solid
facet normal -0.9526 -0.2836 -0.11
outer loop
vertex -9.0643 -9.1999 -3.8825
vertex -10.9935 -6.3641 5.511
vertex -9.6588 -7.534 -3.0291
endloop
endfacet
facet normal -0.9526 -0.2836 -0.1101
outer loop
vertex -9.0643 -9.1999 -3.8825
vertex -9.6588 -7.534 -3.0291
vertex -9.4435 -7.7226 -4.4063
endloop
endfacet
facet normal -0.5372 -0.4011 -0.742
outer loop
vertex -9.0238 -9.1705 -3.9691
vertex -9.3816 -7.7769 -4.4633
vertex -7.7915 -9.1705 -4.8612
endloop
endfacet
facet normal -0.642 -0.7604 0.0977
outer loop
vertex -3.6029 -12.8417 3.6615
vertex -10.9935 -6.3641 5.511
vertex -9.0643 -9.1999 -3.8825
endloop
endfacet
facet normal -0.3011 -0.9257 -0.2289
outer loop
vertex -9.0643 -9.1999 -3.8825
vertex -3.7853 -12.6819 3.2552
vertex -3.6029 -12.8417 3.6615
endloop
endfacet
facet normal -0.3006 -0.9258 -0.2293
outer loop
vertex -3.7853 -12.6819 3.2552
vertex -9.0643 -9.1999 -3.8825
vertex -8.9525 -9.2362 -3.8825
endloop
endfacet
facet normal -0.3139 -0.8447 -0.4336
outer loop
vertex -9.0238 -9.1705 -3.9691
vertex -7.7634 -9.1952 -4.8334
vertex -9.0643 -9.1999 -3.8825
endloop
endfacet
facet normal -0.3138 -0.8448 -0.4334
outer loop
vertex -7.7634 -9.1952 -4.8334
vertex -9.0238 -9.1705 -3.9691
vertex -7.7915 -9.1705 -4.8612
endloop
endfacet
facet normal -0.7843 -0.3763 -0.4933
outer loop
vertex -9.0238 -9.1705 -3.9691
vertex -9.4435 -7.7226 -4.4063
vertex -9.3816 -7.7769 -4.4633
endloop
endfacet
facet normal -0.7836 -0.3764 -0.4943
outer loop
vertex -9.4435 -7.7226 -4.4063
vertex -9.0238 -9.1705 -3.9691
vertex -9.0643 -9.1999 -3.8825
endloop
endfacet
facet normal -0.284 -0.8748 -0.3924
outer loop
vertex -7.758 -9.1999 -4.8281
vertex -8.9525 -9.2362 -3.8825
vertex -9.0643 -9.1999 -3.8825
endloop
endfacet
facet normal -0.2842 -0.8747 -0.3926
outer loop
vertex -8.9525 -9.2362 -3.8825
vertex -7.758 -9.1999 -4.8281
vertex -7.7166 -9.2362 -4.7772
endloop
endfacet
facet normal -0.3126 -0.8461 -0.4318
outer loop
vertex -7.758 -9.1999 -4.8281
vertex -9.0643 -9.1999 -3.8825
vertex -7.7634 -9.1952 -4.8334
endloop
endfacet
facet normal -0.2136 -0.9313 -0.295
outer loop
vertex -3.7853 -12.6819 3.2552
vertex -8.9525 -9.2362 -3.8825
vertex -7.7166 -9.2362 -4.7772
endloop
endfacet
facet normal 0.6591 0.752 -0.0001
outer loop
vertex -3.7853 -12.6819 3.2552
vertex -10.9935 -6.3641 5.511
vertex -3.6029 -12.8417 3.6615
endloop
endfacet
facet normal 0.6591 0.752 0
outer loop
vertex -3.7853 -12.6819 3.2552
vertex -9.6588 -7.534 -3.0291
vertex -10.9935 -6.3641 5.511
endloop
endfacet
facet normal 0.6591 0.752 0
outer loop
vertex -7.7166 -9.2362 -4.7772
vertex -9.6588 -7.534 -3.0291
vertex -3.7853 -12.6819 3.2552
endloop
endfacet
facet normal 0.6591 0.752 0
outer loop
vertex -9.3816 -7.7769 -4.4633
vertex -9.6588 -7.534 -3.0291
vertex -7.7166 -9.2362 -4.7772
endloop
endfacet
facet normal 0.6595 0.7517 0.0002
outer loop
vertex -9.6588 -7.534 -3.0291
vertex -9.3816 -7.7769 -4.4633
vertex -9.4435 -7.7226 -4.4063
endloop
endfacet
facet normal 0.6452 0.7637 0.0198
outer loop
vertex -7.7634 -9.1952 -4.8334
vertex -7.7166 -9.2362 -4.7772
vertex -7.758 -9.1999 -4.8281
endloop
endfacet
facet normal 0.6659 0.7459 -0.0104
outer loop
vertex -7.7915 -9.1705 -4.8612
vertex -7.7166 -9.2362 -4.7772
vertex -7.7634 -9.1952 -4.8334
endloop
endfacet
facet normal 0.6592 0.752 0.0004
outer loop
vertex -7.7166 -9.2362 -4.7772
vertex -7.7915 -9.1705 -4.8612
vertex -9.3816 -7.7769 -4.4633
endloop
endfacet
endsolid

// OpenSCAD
// Auto-generated OpenSCAD file

    inner_points = 10*[[-0.8272709439258851, 0.17250574680152558, -1.085356370379995], [-0.3000208722060624, -0.673824517218672, -1.1610692891914136], [0.7621572748828489, 1.018836010821184, 0.5227077285305861], [1.2894073466026714, 0.17250574680098618, 0.44699480971916755], [-0.7345602979402426, 1.0188360108215655, -0.5608281820767405], [0.53833397596794, -1.0243859908227981, -0.74361533751812], [-0.07619757329115358, 1.3693974844253103, 0.10525377685729254], [1.1966967006170288, -0.6738245172190535, -0.0775333785840871], [-1.0912605548199168, -0.6305363851239965, -0.5510972387851012], [0.6291241521432895, 0.2855248915222844, 1.189458799445929], [-0.9199536182758472, 0.9332780322219801, 0.41810447601210515], [0.4578172155992198, -1.278289525823692, 0.22025708464872243], [-1.326431597387023, 0.2855248915227826, -0.22624909246720426], [-0.3522004978329189, -1.2782895258234854, -0.36614832454032104], [-0.10993590484370842, 0.9332780322217736, 1.0045098852011487], [0.8642951947103956, -0.6305363851244946, 0.864610653128032], [0.018107748679271438, 0.7039670605239071, -1.1390568182894552], [0.5453578203990939, -0.14236320349629056, -1.2147697371008737], [0.6764704733283603, 1.054528534127652, -0.47297485935542216], [1.203720545048183, 0.20819827010745423, -0.5486877781668408]];

    outer_points = 10*[[0.8642951947101556, -0.6305363851244028, -0.8646106531284449], [0.6291241521429305, 0.28552489152246463, -1.1894587994460062], [-1.0912605548197898, -0.6305363851244028, 0.551097238785195], [-1.3264315973870149, 0.28552489152246463, 0.22624909246763364], [0.45781721559917127, -1.2782895258238085, -0.2202570846492242], [-0.10993590484404386, 0.9332780322218704, -1.0045098852008405], [-0.35220049783281543, -1.2782895258238085, 0.3661483245400292], [-0.9199536182760306, 0.9332780322218704, -0.41810447601158707], [1.2894073466025096, 0.17250574680096908, -0.4469948097194502], [-0.8272709439256501, 0.17250574680096908, 1.0853563703802613], [0.5383339759681318, -1.0243859908232005, 0.7436153375176736], [-0.0761975732912725, 1.3693974844251389, -0.1052537768568624], [1.1966967006170348, -0.6738245172192313, 0.07753337858357512], [0.7621572748826352, 1.0188360108211696, -0.5227077285304783], [-0.3000208722057758, -0.6738245172192313, 1.1610692891912895], [-0.7345602979401754, 1.0188360108211696, 0.5608281820772362], [-0.08831976886428294, -0.9141133036386847, -0.9746509296639724], [-0.323490811431508, 0.001947973008182724, -1.299499075981534], [-0.8983374822962696, -0.9141133036386847, -0.38824552047471894], [-1.1335085248634946, 0.001947973008182724, -0.7130936667922804]];

    // Convex hull for inner set (I)
    module inner_hull() {
        hull() {
            for (p = inner_points) {
                translate(p) sphere(r=0.1);
            }
        }
    }

    // Convex hull for outer set (O) minus inner hull (O \ I)
    module outer_minus_inner() {
        difference() {
            hull() {
                for (p = outer_points) {
                    translate(p) sphere(r=0.1);
                }
            }
            inner_hull(); // Subtract inner hull
        }
    }

    // Convex hull for outer set (O) minus all translated inner hulls
    module outer_minus_AllTranslationInner() {
        difference() {
            hull() {
                for (p = outer_points) {
                    translate(p) sphere(r=0.1);
                }
            }
            hull() {
                translate([0,0,50]) inner_hull();
                translate([0,0,-50]) inner_hull();
            }; // Subtract translated inner hulls
        }
    }

    // Difference between outer_minus_inner and outer_minus_AllTranslationInner
    module outer_minus_inner_diff() {
        difference() {
            // Outer minus inner
            difference() {
                hull() {
                    for (p = outer_points) {
                        translate(p) sphere(r=0.1);
                    }
                }
                inner_hull();
            }

            // Subtract Outer minus AllTranslationInner
            difference() {
                hull() {
                    for (p = outer_points) {
                        translate(p) sphere(r=0.1);
                    }
                }
                hull() {
                    translate([0,0,50]) inner_hull();
                    translate([0,0,-50]) inner_hull();
                };
            }
        }
    }

    // Rendering all with colors applied
    color([0, 1, 0, 1]) outer_minus_AllTranslationInner(); // Opaque green
    
